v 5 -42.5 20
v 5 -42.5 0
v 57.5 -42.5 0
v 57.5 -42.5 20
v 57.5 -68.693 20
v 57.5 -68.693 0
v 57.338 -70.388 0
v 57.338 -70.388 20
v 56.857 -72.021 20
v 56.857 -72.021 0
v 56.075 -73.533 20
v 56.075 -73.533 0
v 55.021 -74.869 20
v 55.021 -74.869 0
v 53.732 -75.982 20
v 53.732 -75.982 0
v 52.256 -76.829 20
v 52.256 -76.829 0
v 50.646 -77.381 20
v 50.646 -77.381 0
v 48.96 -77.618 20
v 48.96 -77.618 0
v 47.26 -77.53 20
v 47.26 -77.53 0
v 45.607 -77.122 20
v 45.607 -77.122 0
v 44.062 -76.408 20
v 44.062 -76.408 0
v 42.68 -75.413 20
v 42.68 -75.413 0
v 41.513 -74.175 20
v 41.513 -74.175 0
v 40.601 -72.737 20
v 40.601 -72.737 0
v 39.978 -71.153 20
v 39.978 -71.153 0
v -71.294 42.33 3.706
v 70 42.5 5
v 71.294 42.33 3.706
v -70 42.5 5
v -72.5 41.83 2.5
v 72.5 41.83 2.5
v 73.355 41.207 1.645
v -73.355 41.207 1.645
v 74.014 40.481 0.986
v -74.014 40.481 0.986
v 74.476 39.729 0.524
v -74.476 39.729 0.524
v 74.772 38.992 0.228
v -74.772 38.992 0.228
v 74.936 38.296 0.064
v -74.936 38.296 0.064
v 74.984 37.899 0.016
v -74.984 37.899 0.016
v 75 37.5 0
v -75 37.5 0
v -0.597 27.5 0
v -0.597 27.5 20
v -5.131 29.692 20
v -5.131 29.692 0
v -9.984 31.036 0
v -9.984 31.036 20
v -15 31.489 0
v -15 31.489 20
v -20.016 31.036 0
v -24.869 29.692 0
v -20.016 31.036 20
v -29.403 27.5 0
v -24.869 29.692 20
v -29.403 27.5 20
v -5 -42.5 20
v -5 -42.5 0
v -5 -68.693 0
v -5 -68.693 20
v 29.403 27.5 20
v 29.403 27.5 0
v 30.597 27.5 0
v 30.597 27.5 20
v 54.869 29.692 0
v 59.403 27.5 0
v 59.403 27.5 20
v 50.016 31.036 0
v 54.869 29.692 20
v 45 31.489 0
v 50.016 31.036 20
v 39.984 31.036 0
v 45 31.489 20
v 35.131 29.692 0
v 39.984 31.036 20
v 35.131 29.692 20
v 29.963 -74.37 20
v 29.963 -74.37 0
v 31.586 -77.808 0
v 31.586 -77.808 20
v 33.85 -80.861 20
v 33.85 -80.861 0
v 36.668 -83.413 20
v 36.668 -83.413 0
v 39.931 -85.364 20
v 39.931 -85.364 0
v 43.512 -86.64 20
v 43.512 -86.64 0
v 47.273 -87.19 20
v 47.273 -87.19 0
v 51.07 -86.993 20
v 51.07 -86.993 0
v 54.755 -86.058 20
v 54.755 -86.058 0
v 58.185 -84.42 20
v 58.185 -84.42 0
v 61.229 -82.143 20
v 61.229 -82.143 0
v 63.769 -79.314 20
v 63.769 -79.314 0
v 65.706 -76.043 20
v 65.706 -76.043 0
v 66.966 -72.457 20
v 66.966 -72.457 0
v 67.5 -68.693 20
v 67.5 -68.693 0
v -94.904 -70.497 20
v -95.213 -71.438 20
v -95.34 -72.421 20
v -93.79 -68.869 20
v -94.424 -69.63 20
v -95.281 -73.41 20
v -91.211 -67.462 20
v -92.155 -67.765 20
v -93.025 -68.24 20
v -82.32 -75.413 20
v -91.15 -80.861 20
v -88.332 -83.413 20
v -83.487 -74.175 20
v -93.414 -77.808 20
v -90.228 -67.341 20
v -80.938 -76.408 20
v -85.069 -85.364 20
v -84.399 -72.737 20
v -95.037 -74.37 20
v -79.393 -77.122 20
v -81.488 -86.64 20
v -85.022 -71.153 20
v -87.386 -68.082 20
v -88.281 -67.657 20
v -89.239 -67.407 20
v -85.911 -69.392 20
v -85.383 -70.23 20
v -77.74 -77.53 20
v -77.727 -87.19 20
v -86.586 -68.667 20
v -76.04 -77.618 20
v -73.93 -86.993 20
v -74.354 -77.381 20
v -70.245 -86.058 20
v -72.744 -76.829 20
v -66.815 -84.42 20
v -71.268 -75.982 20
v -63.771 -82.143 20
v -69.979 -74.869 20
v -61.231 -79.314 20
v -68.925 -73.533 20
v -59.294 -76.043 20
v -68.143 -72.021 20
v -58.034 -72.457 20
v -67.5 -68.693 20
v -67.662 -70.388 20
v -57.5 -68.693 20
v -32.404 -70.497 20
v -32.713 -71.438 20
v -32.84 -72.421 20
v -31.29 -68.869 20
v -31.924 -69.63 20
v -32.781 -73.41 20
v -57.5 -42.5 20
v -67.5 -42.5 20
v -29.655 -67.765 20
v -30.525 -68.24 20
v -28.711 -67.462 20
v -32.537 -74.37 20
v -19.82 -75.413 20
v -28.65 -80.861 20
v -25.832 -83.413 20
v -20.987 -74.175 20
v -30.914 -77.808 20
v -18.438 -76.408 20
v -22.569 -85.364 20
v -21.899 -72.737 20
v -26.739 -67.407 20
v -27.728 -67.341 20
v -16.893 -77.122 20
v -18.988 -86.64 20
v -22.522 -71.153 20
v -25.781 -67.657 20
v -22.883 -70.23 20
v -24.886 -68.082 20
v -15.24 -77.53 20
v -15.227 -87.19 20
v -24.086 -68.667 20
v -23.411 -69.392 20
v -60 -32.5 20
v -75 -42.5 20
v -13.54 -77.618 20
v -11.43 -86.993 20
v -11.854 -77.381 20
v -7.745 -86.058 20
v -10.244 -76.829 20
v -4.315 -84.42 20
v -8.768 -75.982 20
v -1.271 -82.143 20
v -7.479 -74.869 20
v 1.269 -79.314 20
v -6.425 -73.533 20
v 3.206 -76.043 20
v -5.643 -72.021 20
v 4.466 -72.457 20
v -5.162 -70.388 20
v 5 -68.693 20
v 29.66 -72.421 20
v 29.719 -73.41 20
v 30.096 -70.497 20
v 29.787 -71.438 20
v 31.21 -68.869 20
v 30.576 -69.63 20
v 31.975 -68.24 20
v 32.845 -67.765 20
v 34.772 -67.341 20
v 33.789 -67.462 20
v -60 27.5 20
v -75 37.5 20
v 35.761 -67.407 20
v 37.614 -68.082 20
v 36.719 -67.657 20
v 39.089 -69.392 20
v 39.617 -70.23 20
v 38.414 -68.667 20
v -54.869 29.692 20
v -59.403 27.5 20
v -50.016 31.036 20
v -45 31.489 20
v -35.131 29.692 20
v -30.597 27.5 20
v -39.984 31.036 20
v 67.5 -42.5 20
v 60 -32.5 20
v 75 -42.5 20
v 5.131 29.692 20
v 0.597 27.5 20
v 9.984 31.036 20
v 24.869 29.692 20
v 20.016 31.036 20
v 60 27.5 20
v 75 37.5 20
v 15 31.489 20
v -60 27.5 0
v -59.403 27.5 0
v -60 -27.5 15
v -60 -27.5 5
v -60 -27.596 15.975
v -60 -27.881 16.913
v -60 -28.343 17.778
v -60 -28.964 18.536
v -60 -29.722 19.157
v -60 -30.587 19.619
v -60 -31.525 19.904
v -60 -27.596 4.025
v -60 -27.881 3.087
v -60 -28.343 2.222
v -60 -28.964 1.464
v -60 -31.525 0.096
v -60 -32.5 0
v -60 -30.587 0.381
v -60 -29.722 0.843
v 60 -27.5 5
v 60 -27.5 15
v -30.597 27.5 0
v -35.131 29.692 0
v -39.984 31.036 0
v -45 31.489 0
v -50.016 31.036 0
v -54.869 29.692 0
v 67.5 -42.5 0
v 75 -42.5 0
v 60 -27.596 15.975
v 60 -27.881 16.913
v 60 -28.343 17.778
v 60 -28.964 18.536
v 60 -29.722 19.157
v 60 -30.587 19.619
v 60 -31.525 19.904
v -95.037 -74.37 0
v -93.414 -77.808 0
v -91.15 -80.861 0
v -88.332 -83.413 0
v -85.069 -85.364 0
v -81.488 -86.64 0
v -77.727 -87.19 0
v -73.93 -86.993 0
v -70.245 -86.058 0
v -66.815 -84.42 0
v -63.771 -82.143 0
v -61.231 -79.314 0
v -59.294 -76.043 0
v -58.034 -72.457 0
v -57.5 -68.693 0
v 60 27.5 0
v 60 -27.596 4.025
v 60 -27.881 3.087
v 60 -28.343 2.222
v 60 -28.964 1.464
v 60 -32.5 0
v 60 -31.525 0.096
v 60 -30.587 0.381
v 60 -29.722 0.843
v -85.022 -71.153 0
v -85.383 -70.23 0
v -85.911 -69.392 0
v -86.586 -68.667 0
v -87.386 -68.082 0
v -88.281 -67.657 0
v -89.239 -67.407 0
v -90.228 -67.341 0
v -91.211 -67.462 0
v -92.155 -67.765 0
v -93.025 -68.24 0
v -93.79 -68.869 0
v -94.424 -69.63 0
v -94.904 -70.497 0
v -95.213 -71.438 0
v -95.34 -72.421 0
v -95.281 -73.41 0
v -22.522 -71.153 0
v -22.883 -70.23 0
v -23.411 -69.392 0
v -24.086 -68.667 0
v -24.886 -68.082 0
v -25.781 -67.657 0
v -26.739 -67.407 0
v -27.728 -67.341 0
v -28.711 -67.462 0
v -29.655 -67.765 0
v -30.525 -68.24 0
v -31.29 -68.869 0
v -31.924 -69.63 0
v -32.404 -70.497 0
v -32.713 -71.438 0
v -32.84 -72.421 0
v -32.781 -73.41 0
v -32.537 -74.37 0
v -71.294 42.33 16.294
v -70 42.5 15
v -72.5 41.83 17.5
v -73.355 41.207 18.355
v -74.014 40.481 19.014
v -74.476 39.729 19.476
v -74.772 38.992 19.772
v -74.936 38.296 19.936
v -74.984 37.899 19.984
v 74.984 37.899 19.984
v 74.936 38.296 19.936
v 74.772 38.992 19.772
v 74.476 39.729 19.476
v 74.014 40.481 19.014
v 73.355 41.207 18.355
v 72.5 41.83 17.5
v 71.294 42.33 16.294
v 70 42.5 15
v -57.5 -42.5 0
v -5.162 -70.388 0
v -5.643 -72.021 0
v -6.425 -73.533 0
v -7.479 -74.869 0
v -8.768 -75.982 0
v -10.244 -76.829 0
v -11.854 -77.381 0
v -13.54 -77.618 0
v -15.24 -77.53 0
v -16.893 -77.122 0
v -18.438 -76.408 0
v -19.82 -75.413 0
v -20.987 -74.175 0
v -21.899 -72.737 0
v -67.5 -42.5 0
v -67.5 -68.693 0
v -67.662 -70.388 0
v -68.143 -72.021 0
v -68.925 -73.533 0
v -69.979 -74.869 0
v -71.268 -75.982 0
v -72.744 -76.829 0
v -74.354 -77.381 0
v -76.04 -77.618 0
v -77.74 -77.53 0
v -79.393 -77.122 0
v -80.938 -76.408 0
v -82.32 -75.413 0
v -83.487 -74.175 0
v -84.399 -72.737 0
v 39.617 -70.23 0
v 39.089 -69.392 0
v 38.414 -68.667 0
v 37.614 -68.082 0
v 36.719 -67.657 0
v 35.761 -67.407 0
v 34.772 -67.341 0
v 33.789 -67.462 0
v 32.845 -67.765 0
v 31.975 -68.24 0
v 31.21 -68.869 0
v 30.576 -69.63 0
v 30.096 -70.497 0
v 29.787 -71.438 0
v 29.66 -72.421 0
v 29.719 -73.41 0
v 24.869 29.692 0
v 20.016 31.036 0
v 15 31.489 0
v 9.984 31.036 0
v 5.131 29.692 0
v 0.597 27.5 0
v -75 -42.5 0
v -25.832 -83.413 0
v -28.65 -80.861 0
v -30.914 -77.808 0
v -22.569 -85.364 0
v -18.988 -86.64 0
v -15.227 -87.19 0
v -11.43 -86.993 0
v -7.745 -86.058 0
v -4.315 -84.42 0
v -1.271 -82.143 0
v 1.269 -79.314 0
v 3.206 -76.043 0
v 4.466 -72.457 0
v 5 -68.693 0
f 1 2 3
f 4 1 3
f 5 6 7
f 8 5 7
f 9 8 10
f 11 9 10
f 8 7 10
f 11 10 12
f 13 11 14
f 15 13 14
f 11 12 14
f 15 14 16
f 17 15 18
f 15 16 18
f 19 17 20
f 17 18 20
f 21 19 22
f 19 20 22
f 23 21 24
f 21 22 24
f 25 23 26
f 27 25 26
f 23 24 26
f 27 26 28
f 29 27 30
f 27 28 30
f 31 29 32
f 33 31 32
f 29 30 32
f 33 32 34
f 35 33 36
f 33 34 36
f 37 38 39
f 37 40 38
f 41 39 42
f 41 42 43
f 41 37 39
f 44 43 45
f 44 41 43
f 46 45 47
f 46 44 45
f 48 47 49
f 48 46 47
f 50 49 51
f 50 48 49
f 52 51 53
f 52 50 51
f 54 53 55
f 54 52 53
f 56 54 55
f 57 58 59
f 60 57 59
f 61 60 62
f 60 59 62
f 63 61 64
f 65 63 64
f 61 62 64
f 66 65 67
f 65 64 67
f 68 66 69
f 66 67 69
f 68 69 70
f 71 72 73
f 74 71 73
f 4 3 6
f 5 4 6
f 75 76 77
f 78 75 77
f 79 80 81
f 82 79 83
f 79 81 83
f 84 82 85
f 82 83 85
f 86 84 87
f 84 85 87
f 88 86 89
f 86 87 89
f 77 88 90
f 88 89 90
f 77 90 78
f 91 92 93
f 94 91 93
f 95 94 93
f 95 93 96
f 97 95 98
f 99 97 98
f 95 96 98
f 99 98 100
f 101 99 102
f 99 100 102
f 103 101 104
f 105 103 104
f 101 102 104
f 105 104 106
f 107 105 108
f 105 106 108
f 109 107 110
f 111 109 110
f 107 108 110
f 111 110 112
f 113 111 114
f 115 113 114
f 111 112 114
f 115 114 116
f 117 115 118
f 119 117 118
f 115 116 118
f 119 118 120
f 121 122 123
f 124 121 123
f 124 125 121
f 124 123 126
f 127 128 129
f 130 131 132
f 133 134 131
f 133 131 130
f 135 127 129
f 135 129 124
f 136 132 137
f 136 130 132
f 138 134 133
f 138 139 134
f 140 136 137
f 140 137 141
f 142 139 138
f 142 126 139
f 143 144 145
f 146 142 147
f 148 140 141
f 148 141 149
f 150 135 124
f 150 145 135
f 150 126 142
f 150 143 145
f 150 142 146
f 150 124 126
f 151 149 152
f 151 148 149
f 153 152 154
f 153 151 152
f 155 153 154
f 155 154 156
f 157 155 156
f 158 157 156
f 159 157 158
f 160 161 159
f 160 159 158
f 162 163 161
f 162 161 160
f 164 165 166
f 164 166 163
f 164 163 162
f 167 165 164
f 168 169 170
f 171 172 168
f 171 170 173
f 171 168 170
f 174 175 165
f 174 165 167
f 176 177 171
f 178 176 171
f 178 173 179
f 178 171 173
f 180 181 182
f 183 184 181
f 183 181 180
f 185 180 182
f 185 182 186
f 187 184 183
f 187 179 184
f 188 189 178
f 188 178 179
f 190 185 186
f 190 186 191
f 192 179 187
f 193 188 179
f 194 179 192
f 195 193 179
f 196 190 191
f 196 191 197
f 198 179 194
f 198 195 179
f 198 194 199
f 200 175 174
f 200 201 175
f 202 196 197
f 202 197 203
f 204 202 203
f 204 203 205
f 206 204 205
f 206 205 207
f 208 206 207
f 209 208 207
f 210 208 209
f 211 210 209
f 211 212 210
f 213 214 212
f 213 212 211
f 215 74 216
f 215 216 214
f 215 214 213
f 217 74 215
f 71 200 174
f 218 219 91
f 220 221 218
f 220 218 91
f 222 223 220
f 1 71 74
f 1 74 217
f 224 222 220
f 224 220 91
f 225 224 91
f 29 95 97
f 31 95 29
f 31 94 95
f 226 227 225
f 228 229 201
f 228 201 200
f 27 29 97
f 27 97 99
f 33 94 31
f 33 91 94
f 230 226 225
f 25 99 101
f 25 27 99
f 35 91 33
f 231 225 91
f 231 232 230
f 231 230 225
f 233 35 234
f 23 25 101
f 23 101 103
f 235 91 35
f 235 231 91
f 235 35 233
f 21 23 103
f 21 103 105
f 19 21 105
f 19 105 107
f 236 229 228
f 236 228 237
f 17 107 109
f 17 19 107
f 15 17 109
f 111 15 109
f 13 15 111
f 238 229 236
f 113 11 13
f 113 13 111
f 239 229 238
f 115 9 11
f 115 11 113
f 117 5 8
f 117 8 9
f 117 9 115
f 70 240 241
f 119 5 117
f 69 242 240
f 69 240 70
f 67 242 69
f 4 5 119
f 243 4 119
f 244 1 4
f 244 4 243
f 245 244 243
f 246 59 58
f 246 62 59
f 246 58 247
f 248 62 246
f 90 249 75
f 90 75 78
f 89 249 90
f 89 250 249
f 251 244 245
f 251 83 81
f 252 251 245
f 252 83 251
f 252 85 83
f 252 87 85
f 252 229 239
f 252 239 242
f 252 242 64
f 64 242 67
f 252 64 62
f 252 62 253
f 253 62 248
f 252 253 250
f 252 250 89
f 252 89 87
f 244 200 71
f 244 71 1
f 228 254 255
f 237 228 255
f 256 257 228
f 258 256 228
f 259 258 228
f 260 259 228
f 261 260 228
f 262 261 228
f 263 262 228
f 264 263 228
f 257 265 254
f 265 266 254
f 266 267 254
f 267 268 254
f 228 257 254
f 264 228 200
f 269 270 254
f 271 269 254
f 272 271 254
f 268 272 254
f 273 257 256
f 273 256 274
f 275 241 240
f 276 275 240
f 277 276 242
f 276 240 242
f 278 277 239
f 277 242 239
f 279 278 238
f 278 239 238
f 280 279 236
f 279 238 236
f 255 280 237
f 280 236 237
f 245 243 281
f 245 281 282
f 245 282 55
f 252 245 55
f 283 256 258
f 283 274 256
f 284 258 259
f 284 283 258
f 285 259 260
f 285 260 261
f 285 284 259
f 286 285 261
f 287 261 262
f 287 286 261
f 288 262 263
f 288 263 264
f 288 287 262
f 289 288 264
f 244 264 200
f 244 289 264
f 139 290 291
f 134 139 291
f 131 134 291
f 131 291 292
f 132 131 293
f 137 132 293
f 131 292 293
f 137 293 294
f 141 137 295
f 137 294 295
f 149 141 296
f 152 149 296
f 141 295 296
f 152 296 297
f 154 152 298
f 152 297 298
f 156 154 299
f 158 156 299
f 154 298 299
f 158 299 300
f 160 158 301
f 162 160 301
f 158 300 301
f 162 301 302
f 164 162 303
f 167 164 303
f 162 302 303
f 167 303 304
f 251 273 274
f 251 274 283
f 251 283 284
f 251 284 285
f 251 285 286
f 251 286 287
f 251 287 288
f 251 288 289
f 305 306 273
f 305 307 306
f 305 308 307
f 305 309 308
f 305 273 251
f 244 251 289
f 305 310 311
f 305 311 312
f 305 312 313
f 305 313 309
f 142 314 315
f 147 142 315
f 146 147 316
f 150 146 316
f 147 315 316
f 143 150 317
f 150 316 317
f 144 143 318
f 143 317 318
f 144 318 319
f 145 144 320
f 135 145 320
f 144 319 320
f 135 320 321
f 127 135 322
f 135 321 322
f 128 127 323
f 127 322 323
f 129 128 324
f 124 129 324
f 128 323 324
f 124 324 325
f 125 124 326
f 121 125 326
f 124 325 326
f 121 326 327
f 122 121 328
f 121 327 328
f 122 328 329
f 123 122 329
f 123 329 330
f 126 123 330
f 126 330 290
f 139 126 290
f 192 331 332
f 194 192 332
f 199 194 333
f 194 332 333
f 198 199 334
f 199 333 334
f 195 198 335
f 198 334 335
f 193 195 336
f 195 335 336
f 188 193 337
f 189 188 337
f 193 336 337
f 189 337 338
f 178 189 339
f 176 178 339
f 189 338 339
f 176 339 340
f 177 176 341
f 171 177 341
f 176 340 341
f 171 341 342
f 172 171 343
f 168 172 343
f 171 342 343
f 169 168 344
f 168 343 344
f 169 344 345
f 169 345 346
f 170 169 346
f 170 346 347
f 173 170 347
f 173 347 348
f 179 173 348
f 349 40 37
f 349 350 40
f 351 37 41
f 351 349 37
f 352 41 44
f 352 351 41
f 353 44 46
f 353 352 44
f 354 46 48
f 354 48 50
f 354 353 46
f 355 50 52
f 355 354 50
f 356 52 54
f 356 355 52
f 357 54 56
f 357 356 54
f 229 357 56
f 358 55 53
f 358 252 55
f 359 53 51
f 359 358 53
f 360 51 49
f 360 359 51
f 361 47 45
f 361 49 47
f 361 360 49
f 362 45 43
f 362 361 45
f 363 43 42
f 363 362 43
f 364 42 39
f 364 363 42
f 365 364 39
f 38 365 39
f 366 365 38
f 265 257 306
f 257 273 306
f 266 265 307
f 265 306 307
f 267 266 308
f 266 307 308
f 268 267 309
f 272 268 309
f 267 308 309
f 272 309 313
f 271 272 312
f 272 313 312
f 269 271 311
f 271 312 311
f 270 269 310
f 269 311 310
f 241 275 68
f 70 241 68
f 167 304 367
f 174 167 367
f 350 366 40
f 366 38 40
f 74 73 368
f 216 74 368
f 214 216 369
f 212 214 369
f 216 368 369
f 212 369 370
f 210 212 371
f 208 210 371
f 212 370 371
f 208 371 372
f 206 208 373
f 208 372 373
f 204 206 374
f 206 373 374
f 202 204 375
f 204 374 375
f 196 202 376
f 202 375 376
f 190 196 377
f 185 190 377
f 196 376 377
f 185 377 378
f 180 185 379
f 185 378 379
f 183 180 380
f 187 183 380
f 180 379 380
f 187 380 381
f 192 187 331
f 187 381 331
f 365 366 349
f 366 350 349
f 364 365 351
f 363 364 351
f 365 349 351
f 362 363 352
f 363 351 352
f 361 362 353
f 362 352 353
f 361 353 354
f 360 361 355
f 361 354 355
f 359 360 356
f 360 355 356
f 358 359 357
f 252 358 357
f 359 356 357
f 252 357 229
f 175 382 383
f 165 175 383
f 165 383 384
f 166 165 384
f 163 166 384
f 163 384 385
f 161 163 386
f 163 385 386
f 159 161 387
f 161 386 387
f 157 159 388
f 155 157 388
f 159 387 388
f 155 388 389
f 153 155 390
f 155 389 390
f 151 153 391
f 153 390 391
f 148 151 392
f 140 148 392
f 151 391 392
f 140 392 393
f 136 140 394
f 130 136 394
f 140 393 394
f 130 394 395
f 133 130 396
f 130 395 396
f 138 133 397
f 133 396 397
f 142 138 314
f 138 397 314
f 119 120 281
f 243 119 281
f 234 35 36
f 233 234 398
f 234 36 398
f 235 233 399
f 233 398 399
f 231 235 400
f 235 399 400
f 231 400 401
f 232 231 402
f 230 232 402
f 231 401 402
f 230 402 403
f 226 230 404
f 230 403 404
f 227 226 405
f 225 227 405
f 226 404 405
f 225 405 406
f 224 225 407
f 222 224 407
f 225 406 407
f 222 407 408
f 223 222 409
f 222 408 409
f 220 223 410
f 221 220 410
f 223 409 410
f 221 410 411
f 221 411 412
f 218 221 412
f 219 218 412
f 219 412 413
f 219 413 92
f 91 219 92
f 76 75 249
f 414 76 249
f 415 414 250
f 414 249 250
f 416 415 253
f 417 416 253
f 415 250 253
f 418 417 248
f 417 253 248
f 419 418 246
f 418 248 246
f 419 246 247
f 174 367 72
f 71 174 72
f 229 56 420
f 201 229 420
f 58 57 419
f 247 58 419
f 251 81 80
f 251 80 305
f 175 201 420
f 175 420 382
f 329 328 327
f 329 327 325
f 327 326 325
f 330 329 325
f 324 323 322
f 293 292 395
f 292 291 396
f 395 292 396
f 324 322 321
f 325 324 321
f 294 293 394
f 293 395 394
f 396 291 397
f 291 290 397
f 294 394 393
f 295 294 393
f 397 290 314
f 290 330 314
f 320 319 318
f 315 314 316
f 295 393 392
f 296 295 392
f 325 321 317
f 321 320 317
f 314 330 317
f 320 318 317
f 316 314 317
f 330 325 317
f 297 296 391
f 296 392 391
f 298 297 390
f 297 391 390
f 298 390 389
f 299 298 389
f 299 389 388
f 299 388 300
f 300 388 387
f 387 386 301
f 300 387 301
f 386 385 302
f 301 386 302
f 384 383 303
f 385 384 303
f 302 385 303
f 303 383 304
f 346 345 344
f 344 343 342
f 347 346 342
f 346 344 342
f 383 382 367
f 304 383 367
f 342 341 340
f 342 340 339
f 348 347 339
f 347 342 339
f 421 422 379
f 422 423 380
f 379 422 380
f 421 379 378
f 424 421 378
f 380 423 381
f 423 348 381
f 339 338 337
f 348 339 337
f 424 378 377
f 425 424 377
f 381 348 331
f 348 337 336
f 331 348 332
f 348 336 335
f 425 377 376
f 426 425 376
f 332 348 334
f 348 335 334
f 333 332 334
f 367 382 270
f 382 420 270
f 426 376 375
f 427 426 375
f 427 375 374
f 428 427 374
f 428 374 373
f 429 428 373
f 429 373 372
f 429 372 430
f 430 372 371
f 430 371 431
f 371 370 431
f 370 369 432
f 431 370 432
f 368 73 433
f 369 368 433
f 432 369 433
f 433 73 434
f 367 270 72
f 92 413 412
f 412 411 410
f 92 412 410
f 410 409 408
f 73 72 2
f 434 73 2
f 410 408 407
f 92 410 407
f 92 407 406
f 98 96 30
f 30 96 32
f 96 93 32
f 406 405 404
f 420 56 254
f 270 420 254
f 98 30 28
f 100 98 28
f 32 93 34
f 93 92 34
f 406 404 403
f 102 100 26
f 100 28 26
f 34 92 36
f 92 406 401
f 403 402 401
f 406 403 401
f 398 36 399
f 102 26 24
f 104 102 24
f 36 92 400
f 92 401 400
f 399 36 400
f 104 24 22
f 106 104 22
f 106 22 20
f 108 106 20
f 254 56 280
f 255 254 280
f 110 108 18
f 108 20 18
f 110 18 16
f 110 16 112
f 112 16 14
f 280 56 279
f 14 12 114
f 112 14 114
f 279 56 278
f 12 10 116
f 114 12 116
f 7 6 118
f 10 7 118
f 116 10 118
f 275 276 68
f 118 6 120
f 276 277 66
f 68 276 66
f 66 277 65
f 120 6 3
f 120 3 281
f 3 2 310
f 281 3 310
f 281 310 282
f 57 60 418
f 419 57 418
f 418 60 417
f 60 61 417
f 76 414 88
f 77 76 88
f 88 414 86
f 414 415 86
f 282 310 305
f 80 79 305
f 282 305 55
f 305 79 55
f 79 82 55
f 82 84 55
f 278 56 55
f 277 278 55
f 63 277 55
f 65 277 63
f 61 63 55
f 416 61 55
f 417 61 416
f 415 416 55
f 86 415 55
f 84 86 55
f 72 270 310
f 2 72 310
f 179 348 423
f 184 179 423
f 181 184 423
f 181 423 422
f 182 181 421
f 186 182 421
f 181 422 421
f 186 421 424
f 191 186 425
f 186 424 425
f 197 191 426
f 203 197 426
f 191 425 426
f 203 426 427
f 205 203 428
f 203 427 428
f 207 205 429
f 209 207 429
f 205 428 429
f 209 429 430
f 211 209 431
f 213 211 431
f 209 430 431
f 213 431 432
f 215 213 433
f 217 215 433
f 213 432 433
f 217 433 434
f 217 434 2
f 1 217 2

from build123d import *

# Parameters (mm, degrees)
F0_W     = 120
F0_H     = 55
F1_DEPTH = 20
F2_R     = 5
F4_DEPTH = 20.001


with BuildPart() as f1:
    # F0 (on Top) → F1 (new body)
    with BuildSketch(Plane.XY):
        Polygon((75, -42.5), (75, 42.5), (-75, 42.5), (-75, -42.5), (-67.5, -42.5), (-57.5, -42.5), (-5, -42.5), (5, -42.5), (57.5, -42.5), (67.5, -42.5), align=None)
        Rectangle(F0_W, F0_H, mode=Mode.SUBTRACT)
        with BuildLine():
            Line((67.5, -68.693042), (67.5, -42.5))
            Line((67.5, -42.5), (57.5, -42.5))
            Line((57.5, -42.5), (57.5, -68.693042))
            ThreePointArc((57.5, -68.693042), (49.808453, -77.539779), (39.978338, -71.152801))
            ThreePointArc((39.978338, -71.152801), (33.309749, -67.591487), (29.962853, -74.370228))
            ThreePointArc((29.962853, -74.370228), (51.069883, -86.993343), (67.5, -68.693042))
        make_face()
        with BuildLine():
            Line((-57.5, -42.5), (-67.5, -42.5))
            Line((-67.5, -42.5), (-67.5, -68.693042))
            ThreePointArc((-67.5, -68.693042), (-75.191547, -77.539779), (-85.021662, -71.152801))
            ThreePointArc((-85.021662, -71.152801), (-91.690251, -67.591487), (-95.037147, -74.370228))
            ThreePointArc((-95.037147, -74.370228), (-73.930117, -86.993343), (-57.5, -68.693042))
            Line((-57.5, -68.693042), (-57.5, -42.5))
        make_face()
        with BuildLine():
            Line((5, -68.693042), (5, -42.5))
            Line((5, -42.5), (-5, -42.5))
            Line((-5, -42.5), (-5, -68.693042))
            ThreePointArc((-5, -68.693042), (-12.691547, -77.539779), (-22.521662, -71.152801))
            ThreePointArc((-22.521662, -71.152801), (-29.190251, -67.591487), (-32.537147, -74.370228))
            ThreePointArc((-32.537147, -74.370228), (-11.430117, -86.993343), (5, -68.693042))
        make_face()
    extrude(amount=F1_DEPTH)

    # F2
    f2_edges = [f1.edges().sort_by_distance(p)[0] for p in [
        (0, 42.5, 20),
        (0, 42.5, 0),
        (-75, 42.5, 10),
        (75, 42.5, 10),
        (0, -27.5, 0),
        (0, -27.5, 20),
    ]]
    fillet(f2_edges, radius=F2_R)

    # F3 (on face) → F4 (cut, through all)
    with BuildSketch(Plane.XY.offset(20)):
        with BuildLine():
            Line((-59.415153, 27.492821), (-30, 27.131766))
            ThreePointArc((-30, 27.131766), (-44.656341, 31.486476), (-59.415153, 27.492821))
        make_face()
        with BuildLine():
            ThreePointArc((59.415153, 27.492821), (44.656341, 31.486476), (30, 27.131766))
            Line((30, 27.131766), (59.415153, 27.492821))
        make_face()
        with BuildLine():
            ThreePointArc((30, 27.131766), (15, 31.488585), (0, 27.131766))
            Line((0, 27.131766), (30, 27.131766))
        make_face()
        with BuildLine():
            ThreePointArc((0, 27.131766), (-15, 31.488585), (-30, 27.131766))
            Line((-30, 27.131766), (0, 27.131766))
        make_face()
    extrude(amount=-F4_DEPTH, mode=Mode.SUBTRACT)


solid = f1.part
